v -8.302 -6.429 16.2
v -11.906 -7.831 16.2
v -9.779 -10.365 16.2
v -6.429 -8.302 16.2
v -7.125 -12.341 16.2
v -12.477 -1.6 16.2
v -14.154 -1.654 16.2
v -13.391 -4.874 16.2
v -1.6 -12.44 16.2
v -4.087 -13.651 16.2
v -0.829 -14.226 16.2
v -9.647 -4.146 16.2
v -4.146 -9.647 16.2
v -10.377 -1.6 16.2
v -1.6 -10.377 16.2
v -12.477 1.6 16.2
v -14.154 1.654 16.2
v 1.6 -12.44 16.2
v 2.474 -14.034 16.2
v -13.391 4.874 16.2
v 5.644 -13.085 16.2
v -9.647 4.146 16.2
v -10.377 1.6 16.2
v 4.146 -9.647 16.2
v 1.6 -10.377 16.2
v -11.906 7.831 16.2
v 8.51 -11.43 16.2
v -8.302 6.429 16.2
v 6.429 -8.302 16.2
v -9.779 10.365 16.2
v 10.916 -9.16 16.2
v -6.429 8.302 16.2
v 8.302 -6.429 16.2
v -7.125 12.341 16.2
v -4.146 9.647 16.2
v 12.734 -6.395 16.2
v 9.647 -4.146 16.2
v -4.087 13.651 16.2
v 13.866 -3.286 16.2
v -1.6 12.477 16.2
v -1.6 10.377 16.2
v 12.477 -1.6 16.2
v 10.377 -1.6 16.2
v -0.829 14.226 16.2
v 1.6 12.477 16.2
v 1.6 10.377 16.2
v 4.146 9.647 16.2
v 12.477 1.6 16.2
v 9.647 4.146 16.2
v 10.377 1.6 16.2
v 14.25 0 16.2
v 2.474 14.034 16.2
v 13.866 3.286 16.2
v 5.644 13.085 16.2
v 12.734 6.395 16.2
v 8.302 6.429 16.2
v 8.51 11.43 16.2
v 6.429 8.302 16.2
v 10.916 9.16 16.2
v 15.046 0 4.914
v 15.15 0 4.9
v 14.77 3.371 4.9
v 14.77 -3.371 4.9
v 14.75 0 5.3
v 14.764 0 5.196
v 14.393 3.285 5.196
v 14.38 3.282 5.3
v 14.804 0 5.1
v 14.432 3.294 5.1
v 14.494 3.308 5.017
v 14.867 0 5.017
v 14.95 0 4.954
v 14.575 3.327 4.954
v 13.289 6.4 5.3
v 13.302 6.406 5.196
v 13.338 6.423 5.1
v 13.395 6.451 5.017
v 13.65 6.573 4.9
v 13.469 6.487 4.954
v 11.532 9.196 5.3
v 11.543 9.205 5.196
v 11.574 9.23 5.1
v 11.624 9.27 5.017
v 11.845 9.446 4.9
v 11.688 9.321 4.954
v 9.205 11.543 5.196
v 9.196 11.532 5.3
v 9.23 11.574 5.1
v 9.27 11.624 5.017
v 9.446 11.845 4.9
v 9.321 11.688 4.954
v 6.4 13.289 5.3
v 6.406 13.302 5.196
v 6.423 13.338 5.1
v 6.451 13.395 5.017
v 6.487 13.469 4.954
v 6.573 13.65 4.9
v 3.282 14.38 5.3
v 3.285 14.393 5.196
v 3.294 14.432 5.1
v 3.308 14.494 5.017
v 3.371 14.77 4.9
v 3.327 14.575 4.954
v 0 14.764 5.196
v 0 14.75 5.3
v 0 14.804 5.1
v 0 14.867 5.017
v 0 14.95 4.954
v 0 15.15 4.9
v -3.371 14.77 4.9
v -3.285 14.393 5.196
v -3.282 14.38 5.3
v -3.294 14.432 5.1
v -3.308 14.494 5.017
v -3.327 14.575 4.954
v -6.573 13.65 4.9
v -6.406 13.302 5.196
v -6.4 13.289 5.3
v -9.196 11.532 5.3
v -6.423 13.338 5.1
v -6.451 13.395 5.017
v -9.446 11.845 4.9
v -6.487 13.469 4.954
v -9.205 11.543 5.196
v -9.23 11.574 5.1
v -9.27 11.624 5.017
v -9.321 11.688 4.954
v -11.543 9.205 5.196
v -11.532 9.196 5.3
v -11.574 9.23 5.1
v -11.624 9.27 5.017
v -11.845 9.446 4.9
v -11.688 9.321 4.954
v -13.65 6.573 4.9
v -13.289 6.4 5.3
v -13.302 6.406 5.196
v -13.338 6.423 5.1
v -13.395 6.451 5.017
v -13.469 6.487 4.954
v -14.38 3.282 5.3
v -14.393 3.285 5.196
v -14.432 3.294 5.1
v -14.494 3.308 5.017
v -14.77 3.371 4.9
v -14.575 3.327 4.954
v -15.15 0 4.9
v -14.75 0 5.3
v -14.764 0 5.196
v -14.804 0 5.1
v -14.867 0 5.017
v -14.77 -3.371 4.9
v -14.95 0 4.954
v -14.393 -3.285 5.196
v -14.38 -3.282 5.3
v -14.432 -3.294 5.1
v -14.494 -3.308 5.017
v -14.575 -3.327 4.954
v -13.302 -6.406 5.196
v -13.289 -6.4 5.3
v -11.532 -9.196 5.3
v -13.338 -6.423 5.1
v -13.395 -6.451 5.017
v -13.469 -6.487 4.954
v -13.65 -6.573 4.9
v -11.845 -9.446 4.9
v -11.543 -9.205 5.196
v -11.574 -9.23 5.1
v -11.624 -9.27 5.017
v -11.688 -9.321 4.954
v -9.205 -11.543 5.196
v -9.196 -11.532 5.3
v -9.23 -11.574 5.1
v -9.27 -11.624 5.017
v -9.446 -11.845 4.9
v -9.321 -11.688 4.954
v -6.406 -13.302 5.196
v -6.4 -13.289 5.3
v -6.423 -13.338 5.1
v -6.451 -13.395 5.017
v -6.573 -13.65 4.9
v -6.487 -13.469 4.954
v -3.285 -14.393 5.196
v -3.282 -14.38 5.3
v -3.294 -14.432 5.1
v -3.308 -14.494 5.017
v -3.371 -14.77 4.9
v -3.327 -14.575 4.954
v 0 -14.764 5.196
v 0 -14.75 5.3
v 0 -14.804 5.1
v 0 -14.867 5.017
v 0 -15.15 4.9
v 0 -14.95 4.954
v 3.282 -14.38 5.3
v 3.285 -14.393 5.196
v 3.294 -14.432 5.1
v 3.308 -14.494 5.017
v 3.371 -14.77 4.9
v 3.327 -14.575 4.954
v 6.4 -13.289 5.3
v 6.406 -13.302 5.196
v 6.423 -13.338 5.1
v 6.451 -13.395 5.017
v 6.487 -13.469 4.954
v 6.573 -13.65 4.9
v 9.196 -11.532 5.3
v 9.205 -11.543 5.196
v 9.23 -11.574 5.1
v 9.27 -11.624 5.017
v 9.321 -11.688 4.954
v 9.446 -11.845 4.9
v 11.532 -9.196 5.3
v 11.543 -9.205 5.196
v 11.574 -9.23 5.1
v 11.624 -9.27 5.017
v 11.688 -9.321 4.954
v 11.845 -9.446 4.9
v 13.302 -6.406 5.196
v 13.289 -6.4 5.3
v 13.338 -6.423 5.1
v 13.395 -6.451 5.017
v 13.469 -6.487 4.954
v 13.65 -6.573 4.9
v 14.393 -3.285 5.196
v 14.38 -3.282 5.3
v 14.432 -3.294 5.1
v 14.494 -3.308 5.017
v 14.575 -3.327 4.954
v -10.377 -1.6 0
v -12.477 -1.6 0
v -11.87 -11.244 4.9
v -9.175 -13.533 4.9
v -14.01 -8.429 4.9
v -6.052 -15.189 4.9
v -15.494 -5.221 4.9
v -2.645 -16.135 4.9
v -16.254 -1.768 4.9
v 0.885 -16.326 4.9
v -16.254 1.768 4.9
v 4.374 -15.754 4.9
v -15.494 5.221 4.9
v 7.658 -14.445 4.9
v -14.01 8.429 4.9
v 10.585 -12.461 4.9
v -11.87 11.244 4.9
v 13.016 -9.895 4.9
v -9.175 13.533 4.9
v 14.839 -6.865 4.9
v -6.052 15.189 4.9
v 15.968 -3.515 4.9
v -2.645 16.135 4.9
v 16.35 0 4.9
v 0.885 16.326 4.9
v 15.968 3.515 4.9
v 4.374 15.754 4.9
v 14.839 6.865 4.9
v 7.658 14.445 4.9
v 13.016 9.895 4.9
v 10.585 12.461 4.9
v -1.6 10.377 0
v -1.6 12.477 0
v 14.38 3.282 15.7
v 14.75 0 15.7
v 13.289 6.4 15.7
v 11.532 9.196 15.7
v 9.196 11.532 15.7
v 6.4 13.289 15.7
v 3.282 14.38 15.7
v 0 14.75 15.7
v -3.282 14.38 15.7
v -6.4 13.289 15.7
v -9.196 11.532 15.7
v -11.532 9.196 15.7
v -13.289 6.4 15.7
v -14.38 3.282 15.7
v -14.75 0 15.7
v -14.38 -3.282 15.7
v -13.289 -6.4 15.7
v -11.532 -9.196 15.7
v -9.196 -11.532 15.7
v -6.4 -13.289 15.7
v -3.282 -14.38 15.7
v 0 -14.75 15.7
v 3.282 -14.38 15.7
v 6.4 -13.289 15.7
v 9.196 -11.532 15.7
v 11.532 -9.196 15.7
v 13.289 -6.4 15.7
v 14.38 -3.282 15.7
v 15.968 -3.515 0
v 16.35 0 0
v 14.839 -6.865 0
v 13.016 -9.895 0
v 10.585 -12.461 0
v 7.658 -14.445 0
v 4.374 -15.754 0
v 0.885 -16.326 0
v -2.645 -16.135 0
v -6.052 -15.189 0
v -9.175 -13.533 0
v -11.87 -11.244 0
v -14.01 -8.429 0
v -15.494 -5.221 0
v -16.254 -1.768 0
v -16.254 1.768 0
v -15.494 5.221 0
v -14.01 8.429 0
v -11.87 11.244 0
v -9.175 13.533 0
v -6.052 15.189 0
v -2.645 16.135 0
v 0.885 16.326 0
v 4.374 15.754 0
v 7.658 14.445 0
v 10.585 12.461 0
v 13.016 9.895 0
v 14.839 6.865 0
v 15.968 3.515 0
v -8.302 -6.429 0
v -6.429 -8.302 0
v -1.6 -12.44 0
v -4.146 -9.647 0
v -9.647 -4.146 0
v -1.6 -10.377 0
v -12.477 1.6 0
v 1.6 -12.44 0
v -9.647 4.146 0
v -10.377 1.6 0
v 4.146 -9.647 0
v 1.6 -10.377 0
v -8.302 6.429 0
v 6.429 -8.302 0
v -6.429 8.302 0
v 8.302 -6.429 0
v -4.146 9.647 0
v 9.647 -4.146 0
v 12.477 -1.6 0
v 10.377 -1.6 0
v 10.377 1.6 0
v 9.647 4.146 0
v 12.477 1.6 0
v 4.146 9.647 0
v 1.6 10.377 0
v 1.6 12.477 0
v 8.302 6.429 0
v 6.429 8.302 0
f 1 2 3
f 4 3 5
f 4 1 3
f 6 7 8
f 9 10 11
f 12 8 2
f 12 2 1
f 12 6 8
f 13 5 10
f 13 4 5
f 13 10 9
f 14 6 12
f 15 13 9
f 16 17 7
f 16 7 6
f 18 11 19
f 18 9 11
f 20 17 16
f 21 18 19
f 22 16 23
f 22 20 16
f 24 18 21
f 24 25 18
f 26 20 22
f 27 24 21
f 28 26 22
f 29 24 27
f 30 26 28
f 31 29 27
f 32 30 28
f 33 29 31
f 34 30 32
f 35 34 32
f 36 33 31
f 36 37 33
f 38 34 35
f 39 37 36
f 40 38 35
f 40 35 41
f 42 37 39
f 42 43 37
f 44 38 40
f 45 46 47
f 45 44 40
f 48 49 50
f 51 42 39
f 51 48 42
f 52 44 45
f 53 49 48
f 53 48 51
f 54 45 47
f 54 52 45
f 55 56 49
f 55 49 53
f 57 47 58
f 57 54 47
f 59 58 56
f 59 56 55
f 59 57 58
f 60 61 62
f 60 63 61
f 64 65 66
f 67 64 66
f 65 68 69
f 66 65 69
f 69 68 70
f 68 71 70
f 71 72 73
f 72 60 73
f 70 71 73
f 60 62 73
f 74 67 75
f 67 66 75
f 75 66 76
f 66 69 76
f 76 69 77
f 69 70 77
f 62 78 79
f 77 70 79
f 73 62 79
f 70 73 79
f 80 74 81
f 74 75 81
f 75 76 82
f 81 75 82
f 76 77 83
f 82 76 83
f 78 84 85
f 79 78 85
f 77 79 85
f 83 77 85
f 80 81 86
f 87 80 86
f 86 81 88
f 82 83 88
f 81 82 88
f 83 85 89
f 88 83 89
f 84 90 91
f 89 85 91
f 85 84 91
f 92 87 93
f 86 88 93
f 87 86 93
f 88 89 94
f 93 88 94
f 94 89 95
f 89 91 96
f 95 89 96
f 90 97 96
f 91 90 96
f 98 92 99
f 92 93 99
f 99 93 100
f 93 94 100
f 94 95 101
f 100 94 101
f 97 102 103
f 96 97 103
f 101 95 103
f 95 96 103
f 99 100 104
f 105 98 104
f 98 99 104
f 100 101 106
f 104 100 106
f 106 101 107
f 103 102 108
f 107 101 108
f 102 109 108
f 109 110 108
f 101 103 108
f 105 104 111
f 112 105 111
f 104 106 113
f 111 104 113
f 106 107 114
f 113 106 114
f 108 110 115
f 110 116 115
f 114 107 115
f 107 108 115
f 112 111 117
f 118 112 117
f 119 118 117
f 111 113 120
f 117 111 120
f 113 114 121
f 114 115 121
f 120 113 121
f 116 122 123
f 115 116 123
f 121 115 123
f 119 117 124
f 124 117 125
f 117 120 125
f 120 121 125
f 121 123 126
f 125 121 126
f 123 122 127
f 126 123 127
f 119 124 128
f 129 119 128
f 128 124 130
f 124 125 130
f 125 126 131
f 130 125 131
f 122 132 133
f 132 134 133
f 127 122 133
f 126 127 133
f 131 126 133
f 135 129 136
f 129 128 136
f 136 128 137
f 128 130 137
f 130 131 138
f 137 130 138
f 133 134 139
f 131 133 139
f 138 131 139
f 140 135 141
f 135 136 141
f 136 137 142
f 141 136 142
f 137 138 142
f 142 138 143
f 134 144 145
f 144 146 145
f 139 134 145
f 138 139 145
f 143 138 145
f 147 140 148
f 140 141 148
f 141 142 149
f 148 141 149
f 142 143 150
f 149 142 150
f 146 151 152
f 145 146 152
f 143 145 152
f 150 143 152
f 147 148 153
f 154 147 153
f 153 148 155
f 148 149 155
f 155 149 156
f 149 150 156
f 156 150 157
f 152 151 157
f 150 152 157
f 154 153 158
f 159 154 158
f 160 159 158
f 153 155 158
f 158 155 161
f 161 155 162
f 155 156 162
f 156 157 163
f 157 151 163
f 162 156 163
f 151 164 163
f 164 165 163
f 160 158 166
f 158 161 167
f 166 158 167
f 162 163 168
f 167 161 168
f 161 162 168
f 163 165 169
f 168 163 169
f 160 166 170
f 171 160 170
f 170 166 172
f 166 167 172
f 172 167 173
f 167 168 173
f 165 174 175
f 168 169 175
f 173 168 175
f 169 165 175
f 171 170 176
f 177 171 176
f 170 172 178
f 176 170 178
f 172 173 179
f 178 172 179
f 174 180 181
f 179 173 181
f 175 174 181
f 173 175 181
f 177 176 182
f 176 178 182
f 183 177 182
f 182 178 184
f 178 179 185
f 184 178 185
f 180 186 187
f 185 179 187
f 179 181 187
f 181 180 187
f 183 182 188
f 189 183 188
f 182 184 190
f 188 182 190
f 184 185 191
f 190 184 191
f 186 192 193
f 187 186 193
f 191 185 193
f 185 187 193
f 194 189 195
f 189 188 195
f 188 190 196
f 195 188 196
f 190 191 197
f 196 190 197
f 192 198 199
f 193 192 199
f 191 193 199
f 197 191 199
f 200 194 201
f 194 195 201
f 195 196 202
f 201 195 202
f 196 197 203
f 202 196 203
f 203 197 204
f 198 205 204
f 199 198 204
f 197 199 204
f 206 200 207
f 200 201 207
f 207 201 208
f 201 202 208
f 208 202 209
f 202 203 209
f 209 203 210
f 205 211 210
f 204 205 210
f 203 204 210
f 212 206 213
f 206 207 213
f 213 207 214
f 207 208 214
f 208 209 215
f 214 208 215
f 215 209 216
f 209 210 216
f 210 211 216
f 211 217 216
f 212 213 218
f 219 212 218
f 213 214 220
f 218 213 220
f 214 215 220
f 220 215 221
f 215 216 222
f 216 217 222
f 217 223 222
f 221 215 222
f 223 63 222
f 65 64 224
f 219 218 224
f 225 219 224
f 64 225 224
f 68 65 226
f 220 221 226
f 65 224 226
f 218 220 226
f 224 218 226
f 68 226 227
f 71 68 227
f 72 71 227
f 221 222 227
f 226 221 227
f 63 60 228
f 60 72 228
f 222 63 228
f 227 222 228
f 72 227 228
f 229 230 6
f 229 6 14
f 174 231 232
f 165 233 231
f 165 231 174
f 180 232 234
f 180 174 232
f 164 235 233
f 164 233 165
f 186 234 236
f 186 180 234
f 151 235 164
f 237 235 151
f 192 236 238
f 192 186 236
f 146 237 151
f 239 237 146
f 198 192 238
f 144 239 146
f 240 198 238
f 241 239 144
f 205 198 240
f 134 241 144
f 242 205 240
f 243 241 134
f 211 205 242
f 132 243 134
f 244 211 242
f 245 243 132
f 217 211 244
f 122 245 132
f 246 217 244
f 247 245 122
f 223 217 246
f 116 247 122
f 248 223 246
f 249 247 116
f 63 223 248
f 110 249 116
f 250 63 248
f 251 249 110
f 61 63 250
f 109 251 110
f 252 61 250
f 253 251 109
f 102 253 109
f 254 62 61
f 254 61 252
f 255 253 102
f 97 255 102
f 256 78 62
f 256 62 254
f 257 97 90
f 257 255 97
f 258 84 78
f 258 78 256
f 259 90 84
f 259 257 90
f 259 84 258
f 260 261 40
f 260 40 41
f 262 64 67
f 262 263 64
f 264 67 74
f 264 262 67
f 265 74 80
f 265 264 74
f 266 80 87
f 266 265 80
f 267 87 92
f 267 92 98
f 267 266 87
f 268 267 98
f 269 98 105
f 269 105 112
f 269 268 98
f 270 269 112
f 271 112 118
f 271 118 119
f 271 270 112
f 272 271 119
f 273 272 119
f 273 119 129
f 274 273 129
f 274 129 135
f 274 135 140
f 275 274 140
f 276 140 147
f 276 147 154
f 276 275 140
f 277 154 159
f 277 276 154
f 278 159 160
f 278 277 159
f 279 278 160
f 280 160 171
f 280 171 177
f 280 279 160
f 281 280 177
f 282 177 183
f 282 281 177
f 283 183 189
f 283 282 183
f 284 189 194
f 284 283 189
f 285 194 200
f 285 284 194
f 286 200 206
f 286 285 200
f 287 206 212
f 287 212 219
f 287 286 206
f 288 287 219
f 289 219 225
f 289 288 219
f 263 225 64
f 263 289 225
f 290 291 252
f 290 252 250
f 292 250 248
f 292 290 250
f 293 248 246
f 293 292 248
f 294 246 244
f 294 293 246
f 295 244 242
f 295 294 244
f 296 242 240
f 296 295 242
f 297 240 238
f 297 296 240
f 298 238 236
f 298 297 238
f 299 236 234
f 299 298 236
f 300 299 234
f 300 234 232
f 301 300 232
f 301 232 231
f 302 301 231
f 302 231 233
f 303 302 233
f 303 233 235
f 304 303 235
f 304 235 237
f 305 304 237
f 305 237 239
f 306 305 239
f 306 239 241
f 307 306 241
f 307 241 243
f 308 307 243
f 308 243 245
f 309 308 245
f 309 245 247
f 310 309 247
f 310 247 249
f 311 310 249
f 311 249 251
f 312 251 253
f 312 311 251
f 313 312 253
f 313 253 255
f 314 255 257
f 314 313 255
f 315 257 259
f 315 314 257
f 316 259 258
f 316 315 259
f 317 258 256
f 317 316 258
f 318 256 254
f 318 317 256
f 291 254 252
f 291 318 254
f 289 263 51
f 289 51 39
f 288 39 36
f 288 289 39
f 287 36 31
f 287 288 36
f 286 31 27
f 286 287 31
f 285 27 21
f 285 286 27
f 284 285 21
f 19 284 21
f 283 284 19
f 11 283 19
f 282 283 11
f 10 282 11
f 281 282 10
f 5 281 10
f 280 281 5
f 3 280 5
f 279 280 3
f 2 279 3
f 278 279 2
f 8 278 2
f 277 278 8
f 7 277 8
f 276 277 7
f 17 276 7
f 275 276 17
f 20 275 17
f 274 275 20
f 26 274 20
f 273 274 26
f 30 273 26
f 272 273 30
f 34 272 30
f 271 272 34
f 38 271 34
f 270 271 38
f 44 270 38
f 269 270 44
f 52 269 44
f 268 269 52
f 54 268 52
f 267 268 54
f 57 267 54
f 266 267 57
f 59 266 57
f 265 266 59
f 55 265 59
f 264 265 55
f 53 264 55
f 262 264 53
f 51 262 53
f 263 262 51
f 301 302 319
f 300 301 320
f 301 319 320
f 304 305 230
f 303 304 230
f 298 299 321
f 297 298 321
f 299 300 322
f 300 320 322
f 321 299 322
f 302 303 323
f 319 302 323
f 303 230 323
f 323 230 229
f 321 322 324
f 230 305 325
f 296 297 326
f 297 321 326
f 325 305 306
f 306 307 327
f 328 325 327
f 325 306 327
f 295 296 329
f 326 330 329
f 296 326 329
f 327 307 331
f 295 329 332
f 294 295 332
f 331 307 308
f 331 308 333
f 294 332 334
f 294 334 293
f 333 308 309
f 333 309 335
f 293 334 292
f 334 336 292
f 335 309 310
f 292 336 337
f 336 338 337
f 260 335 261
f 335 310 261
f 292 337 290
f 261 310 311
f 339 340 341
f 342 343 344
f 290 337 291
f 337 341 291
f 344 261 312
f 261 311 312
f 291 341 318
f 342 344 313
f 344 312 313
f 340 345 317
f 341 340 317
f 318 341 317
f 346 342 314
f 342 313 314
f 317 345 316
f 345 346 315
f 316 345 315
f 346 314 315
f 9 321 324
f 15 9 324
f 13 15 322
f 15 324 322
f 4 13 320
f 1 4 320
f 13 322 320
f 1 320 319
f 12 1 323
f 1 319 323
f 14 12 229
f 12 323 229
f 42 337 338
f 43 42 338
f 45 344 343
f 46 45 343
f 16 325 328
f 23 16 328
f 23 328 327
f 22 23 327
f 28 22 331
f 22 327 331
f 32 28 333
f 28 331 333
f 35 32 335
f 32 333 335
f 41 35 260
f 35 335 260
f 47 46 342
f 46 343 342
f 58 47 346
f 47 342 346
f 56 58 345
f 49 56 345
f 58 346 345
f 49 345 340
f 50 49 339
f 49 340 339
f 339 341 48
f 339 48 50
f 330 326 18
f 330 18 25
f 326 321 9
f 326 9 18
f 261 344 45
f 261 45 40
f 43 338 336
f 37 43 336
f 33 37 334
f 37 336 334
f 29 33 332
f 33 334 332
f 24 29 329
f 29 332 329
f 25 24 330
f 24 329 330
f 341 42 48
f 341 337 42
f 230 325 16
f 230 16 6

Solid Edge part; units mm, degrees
sketch "Sketch1" plane through (0, 0, 0) normal (0, 0, 1) x (1, 0, 0)
  circle A0 centre (0, 0) radius 16.35
  line L0 (-12.4774, -1.6) -> (-10.3774, -1.6)
  line L1 (-12.4774, 0) -> (-12.4774, -1.6)
  line L2 (-12.4774, 0) -> (-12.4774, 1.6)
  line L3 (-12.4774, 1.6) -> (-10.3774, 1.6)
  arc A1 (-10.3774, 1.6) -> (-1.6, 10.3774) centre (0, 0) cw
  line L4 (-1.6, 12.4774) -> (-1.6, 10.3774)
  line L5 (0, 12.4774) -> (-1.6, 12.4774)
  line L6 (0, 12.4774) -> (1.6, 12.4774)
  line L7 (1.6, 12.4774) -> (1.6, 10.3774)
  arc A2 (1.6, 10.3774) -> (10.3774, 1.6) centre (0, 0) cw
  line L8 (12.4774, 1.6) -> (10.3774, 1.6)
  line L9 (12.4774, 0) -> (12.4774, 1.6)
  line L10 (12.4774, 0) -> (12.4774, -1.6)
  line L11 (12.4774, -1.6) -> (10.3774, -1.6)
  arc A3 (10.3774, -1.6) -> (1.6, -10.3774) centre (0, 0) cw
  line L12 (1.6, -12.4405) -> (1.6, -10.3774)
  line L13 (0, -12.4405) -> (1.6, -12.4405)
  line L14 (0, -12.4405) -> (-1.6, -12.4405)
  line L15 (-1.6, -12.4405) -> (-1.6, -10.3774)
  arc A4 (-1.6, -10.3774) -> (-10.3774, -1.6) centre (0, 0) cw
extrude "Protrusion1" add sketch "Sketch1" along normal blind 16.2
sketch "Sketch2" plane through (0, 0, 16.2) normal (0, 0, 1) x (1, 0, 0)
  circle A0 centre (0, 0) radius 14.75
  circle A1 centre (0, 0) radius 17.5589
extrude "ScavoEstrusione_1" cut sketch "Sketch2" against normal blind 11.3
chamfer "Smusso_1" distance 0.5 angle 45 1 edges at (-14.75, 0, 16.2)
fillet "Rotondo_1" radius 0.4 1 edges at (-14.75, 0, 4.9)
